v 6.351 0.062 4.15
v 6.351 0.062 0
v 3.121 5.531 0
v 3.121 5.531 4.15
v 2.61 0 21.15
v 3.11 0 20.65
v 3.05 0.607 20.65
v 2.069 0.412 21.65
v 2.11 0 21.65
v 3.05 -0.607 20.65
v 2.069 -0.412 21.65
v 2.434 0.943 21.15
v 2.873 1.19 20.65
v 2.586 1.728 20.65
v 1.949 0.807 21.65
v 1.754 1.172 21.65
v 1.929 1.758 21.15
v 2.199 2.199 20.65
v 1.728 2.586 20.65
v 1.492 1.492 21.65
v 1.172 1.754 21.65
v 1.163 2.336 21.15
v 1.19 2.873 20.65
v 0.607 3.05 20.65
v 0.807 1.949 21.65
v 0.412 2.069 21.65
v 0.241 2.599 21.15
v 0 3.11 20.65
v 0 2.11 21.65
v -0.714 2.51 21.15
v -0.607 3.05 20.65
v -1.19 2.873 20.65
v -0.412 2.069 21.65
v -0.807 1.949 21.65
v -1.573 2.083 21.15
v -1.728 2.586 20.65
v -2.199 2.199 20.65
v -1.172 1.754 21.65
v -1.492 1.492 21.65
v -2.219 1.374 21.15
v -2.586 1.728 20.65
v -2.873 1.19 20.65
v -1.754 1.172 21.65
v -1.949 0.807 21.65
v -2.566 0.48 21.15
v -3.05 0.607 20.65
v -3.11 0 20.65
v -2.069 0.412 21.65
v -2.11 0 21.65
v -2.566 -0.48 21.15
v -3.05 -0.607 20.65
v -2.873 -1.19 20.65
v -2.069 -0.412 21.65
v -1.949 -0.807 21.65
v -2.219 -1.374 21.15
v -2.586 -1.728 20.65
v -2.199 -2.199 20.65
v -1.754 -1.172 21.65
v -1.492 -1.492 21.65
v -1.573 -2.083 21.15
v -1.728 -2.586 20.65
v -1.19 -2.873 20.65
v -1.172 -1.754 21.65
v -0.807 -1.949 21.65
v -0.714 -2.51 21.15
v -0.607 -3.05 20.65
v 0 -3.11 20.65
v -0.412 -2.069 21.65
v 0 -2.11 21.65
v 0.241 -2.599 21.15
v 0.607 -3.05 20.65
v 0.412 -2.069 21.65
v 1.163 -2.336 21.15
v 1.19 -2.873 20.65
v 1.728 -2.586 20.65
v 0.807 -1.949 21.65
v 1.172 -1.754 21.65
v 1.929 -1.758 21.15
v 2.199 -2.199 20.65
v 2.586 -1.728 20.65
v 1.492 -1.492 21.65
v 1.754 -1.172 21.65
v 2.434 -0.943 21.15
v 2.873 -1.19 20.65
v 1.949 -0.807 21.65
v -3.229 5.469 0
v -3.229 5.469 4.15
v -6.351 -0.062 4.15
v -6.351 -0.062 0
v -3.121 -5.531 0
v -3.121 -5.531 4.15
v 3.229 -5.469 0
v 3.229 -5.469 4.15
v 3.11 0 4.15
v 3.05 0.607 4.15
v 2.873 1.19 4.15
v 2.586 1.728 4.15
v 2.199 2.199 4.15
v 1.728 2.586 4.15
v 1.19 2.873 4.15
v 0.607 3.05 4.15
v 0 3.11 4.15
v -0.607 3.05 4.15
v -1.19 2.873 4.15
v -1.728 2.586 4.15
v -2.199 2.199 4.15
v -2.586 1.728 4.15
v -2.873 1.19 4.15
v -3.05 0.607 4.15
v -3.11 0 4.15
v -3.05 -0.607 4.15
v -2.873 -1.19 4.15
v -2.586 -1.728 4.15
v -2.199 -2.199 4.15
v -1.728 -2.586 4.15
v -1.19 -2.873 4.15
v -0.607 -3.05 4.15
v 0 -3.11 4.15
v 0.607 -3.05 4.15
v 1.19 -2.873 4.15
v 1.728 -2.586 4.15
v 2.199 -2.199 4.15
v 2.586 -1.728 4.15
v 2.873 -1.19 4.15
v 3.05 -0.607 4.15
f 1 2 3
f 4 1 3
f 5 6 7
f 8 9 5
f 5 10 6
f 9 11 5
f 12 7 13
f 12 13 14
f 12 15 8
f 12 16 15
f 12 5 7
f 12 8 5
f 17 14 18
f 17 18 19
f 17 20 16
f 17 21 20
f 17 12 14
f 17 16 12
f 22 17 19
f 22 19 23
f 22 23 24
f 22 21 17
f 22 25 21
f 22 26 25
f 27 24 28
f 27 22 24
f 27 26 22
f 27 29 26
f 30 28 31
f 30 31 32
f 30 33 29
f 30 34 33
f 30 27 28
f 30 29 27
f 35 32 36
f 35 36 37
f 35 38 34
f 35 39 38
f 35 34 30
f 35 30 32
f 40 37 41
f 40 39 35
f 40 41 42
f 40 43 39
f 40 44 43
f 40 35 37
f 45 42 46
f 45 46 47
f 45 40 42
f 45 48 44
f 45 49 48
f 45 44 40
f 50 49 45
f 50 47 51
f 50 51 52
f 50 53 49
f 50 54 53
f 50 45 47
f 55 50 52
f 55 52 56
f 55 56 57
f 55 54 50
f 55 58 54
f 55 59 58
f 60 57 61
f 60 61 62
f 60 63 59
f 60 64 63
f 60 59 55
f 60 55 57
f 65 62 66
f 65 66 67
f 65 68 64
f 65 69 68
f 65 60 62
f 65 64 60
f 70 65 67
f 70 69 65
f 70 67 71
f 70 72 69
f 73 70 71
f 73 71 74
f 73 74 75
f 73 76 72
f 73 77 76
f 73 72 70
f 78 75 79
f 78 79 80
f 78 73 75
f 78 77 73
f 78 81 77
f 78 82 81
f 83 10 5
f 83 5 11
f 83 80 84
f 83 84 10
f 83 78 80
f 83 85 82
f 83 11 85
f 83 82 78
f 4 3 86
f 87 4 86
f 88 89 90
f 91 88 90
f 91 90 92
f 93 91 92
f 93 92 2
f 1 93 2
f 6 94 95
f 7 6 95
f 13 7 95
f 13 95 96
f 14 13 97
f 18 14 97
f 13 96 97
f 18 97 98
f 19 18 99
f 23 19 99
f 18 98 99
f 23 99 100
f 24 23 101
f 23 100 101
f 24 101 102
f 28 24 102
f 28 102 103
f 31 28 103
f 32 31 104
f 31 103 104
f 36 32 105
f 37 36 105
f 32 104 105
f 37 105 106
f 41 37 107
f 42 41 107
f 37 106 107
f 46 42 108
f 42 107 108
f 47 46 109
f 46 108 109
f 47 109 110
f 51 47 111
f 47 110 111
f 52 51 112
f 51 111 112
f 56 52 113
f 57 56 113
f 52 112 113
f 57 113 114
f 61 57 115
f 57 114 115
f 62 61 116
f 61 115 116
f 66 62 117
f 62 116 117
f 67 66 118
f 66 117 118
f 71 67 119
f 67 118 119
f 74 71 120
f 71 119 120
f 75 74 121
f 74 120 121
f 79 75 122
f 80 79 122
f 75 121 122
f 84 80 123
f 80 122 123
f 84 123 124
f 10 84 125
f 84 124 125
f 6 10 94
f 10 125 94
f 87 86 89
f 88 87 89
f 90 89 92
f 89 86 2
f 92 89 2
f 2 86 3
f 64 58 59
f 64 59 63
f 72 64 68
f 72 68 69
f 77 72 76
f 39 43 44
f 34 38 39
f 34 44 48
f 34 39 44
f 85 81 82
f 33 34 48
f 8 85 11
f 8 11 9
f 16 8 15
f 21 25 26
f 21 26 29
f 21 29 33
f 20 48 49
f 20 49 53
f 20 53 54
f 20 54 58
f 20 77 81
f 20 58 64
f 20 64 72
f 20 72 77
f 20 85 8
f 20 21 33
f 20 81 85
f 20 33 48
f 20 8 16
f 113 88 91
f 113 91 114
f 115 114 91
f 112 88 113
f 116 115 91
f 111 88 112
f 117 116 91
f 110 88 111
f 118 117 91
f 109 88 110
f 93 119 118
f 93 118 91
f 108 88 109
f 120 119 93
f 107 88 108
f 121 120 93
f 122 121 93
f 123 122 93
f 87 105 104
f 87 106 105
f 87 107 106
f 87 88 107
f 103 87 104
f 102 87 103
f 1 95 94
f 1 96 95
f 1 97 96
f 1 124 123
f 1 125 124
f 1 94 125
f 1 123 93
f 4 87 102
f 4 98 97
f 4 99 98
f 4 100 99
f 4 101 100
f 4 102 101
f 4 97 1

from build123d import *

# Parameters (mm, degrees)
DODANIE_WYCI_GNI_CIE1_DEPTH = 4.15
SZKIC2_R                    = 3.11
DODANIE_WYCI_GNI_CIE2_DEPTH = 17.5
SFAZOWANIE1_SIZE            = 1


with BuildPart() as part:
    # Szkic1 → Dodanie-wyciągnięcie1 (new body)
    with BuildSketch(Plane.XY):
        Polygon((-3.229086971, 5.468668089), (-6.350548975, -0.062137304), (-3.121462004, -5.530805393), (3.229086971, -5.468668089), (6.350548975, 0.062137304), (3.121462004, 5.530805393), align=None)
    extrude(amount=DODANIE_WYCI_GNI_CIE1_DEPTH)

    # Szkic2 → Dodanie-wyciągnięcie2 (add)
    with BuildSketch(Plane.XY.offset(4.15)):
        Circle(SZKIC2_R)
    extrude(amount=DODANIE_WYCI_GNI_CIE2_DEPTH)

    # Sfazowanie1
    sfazowanie1_edges = [part.edges().sort_by_distance(p)[0] for p in [
        (-3.11, 0, 21.65),
    ]]
    chamfer(sfazowanie1_edges, length=SFAZOWANIE1_SIZE)


solid = part.part
